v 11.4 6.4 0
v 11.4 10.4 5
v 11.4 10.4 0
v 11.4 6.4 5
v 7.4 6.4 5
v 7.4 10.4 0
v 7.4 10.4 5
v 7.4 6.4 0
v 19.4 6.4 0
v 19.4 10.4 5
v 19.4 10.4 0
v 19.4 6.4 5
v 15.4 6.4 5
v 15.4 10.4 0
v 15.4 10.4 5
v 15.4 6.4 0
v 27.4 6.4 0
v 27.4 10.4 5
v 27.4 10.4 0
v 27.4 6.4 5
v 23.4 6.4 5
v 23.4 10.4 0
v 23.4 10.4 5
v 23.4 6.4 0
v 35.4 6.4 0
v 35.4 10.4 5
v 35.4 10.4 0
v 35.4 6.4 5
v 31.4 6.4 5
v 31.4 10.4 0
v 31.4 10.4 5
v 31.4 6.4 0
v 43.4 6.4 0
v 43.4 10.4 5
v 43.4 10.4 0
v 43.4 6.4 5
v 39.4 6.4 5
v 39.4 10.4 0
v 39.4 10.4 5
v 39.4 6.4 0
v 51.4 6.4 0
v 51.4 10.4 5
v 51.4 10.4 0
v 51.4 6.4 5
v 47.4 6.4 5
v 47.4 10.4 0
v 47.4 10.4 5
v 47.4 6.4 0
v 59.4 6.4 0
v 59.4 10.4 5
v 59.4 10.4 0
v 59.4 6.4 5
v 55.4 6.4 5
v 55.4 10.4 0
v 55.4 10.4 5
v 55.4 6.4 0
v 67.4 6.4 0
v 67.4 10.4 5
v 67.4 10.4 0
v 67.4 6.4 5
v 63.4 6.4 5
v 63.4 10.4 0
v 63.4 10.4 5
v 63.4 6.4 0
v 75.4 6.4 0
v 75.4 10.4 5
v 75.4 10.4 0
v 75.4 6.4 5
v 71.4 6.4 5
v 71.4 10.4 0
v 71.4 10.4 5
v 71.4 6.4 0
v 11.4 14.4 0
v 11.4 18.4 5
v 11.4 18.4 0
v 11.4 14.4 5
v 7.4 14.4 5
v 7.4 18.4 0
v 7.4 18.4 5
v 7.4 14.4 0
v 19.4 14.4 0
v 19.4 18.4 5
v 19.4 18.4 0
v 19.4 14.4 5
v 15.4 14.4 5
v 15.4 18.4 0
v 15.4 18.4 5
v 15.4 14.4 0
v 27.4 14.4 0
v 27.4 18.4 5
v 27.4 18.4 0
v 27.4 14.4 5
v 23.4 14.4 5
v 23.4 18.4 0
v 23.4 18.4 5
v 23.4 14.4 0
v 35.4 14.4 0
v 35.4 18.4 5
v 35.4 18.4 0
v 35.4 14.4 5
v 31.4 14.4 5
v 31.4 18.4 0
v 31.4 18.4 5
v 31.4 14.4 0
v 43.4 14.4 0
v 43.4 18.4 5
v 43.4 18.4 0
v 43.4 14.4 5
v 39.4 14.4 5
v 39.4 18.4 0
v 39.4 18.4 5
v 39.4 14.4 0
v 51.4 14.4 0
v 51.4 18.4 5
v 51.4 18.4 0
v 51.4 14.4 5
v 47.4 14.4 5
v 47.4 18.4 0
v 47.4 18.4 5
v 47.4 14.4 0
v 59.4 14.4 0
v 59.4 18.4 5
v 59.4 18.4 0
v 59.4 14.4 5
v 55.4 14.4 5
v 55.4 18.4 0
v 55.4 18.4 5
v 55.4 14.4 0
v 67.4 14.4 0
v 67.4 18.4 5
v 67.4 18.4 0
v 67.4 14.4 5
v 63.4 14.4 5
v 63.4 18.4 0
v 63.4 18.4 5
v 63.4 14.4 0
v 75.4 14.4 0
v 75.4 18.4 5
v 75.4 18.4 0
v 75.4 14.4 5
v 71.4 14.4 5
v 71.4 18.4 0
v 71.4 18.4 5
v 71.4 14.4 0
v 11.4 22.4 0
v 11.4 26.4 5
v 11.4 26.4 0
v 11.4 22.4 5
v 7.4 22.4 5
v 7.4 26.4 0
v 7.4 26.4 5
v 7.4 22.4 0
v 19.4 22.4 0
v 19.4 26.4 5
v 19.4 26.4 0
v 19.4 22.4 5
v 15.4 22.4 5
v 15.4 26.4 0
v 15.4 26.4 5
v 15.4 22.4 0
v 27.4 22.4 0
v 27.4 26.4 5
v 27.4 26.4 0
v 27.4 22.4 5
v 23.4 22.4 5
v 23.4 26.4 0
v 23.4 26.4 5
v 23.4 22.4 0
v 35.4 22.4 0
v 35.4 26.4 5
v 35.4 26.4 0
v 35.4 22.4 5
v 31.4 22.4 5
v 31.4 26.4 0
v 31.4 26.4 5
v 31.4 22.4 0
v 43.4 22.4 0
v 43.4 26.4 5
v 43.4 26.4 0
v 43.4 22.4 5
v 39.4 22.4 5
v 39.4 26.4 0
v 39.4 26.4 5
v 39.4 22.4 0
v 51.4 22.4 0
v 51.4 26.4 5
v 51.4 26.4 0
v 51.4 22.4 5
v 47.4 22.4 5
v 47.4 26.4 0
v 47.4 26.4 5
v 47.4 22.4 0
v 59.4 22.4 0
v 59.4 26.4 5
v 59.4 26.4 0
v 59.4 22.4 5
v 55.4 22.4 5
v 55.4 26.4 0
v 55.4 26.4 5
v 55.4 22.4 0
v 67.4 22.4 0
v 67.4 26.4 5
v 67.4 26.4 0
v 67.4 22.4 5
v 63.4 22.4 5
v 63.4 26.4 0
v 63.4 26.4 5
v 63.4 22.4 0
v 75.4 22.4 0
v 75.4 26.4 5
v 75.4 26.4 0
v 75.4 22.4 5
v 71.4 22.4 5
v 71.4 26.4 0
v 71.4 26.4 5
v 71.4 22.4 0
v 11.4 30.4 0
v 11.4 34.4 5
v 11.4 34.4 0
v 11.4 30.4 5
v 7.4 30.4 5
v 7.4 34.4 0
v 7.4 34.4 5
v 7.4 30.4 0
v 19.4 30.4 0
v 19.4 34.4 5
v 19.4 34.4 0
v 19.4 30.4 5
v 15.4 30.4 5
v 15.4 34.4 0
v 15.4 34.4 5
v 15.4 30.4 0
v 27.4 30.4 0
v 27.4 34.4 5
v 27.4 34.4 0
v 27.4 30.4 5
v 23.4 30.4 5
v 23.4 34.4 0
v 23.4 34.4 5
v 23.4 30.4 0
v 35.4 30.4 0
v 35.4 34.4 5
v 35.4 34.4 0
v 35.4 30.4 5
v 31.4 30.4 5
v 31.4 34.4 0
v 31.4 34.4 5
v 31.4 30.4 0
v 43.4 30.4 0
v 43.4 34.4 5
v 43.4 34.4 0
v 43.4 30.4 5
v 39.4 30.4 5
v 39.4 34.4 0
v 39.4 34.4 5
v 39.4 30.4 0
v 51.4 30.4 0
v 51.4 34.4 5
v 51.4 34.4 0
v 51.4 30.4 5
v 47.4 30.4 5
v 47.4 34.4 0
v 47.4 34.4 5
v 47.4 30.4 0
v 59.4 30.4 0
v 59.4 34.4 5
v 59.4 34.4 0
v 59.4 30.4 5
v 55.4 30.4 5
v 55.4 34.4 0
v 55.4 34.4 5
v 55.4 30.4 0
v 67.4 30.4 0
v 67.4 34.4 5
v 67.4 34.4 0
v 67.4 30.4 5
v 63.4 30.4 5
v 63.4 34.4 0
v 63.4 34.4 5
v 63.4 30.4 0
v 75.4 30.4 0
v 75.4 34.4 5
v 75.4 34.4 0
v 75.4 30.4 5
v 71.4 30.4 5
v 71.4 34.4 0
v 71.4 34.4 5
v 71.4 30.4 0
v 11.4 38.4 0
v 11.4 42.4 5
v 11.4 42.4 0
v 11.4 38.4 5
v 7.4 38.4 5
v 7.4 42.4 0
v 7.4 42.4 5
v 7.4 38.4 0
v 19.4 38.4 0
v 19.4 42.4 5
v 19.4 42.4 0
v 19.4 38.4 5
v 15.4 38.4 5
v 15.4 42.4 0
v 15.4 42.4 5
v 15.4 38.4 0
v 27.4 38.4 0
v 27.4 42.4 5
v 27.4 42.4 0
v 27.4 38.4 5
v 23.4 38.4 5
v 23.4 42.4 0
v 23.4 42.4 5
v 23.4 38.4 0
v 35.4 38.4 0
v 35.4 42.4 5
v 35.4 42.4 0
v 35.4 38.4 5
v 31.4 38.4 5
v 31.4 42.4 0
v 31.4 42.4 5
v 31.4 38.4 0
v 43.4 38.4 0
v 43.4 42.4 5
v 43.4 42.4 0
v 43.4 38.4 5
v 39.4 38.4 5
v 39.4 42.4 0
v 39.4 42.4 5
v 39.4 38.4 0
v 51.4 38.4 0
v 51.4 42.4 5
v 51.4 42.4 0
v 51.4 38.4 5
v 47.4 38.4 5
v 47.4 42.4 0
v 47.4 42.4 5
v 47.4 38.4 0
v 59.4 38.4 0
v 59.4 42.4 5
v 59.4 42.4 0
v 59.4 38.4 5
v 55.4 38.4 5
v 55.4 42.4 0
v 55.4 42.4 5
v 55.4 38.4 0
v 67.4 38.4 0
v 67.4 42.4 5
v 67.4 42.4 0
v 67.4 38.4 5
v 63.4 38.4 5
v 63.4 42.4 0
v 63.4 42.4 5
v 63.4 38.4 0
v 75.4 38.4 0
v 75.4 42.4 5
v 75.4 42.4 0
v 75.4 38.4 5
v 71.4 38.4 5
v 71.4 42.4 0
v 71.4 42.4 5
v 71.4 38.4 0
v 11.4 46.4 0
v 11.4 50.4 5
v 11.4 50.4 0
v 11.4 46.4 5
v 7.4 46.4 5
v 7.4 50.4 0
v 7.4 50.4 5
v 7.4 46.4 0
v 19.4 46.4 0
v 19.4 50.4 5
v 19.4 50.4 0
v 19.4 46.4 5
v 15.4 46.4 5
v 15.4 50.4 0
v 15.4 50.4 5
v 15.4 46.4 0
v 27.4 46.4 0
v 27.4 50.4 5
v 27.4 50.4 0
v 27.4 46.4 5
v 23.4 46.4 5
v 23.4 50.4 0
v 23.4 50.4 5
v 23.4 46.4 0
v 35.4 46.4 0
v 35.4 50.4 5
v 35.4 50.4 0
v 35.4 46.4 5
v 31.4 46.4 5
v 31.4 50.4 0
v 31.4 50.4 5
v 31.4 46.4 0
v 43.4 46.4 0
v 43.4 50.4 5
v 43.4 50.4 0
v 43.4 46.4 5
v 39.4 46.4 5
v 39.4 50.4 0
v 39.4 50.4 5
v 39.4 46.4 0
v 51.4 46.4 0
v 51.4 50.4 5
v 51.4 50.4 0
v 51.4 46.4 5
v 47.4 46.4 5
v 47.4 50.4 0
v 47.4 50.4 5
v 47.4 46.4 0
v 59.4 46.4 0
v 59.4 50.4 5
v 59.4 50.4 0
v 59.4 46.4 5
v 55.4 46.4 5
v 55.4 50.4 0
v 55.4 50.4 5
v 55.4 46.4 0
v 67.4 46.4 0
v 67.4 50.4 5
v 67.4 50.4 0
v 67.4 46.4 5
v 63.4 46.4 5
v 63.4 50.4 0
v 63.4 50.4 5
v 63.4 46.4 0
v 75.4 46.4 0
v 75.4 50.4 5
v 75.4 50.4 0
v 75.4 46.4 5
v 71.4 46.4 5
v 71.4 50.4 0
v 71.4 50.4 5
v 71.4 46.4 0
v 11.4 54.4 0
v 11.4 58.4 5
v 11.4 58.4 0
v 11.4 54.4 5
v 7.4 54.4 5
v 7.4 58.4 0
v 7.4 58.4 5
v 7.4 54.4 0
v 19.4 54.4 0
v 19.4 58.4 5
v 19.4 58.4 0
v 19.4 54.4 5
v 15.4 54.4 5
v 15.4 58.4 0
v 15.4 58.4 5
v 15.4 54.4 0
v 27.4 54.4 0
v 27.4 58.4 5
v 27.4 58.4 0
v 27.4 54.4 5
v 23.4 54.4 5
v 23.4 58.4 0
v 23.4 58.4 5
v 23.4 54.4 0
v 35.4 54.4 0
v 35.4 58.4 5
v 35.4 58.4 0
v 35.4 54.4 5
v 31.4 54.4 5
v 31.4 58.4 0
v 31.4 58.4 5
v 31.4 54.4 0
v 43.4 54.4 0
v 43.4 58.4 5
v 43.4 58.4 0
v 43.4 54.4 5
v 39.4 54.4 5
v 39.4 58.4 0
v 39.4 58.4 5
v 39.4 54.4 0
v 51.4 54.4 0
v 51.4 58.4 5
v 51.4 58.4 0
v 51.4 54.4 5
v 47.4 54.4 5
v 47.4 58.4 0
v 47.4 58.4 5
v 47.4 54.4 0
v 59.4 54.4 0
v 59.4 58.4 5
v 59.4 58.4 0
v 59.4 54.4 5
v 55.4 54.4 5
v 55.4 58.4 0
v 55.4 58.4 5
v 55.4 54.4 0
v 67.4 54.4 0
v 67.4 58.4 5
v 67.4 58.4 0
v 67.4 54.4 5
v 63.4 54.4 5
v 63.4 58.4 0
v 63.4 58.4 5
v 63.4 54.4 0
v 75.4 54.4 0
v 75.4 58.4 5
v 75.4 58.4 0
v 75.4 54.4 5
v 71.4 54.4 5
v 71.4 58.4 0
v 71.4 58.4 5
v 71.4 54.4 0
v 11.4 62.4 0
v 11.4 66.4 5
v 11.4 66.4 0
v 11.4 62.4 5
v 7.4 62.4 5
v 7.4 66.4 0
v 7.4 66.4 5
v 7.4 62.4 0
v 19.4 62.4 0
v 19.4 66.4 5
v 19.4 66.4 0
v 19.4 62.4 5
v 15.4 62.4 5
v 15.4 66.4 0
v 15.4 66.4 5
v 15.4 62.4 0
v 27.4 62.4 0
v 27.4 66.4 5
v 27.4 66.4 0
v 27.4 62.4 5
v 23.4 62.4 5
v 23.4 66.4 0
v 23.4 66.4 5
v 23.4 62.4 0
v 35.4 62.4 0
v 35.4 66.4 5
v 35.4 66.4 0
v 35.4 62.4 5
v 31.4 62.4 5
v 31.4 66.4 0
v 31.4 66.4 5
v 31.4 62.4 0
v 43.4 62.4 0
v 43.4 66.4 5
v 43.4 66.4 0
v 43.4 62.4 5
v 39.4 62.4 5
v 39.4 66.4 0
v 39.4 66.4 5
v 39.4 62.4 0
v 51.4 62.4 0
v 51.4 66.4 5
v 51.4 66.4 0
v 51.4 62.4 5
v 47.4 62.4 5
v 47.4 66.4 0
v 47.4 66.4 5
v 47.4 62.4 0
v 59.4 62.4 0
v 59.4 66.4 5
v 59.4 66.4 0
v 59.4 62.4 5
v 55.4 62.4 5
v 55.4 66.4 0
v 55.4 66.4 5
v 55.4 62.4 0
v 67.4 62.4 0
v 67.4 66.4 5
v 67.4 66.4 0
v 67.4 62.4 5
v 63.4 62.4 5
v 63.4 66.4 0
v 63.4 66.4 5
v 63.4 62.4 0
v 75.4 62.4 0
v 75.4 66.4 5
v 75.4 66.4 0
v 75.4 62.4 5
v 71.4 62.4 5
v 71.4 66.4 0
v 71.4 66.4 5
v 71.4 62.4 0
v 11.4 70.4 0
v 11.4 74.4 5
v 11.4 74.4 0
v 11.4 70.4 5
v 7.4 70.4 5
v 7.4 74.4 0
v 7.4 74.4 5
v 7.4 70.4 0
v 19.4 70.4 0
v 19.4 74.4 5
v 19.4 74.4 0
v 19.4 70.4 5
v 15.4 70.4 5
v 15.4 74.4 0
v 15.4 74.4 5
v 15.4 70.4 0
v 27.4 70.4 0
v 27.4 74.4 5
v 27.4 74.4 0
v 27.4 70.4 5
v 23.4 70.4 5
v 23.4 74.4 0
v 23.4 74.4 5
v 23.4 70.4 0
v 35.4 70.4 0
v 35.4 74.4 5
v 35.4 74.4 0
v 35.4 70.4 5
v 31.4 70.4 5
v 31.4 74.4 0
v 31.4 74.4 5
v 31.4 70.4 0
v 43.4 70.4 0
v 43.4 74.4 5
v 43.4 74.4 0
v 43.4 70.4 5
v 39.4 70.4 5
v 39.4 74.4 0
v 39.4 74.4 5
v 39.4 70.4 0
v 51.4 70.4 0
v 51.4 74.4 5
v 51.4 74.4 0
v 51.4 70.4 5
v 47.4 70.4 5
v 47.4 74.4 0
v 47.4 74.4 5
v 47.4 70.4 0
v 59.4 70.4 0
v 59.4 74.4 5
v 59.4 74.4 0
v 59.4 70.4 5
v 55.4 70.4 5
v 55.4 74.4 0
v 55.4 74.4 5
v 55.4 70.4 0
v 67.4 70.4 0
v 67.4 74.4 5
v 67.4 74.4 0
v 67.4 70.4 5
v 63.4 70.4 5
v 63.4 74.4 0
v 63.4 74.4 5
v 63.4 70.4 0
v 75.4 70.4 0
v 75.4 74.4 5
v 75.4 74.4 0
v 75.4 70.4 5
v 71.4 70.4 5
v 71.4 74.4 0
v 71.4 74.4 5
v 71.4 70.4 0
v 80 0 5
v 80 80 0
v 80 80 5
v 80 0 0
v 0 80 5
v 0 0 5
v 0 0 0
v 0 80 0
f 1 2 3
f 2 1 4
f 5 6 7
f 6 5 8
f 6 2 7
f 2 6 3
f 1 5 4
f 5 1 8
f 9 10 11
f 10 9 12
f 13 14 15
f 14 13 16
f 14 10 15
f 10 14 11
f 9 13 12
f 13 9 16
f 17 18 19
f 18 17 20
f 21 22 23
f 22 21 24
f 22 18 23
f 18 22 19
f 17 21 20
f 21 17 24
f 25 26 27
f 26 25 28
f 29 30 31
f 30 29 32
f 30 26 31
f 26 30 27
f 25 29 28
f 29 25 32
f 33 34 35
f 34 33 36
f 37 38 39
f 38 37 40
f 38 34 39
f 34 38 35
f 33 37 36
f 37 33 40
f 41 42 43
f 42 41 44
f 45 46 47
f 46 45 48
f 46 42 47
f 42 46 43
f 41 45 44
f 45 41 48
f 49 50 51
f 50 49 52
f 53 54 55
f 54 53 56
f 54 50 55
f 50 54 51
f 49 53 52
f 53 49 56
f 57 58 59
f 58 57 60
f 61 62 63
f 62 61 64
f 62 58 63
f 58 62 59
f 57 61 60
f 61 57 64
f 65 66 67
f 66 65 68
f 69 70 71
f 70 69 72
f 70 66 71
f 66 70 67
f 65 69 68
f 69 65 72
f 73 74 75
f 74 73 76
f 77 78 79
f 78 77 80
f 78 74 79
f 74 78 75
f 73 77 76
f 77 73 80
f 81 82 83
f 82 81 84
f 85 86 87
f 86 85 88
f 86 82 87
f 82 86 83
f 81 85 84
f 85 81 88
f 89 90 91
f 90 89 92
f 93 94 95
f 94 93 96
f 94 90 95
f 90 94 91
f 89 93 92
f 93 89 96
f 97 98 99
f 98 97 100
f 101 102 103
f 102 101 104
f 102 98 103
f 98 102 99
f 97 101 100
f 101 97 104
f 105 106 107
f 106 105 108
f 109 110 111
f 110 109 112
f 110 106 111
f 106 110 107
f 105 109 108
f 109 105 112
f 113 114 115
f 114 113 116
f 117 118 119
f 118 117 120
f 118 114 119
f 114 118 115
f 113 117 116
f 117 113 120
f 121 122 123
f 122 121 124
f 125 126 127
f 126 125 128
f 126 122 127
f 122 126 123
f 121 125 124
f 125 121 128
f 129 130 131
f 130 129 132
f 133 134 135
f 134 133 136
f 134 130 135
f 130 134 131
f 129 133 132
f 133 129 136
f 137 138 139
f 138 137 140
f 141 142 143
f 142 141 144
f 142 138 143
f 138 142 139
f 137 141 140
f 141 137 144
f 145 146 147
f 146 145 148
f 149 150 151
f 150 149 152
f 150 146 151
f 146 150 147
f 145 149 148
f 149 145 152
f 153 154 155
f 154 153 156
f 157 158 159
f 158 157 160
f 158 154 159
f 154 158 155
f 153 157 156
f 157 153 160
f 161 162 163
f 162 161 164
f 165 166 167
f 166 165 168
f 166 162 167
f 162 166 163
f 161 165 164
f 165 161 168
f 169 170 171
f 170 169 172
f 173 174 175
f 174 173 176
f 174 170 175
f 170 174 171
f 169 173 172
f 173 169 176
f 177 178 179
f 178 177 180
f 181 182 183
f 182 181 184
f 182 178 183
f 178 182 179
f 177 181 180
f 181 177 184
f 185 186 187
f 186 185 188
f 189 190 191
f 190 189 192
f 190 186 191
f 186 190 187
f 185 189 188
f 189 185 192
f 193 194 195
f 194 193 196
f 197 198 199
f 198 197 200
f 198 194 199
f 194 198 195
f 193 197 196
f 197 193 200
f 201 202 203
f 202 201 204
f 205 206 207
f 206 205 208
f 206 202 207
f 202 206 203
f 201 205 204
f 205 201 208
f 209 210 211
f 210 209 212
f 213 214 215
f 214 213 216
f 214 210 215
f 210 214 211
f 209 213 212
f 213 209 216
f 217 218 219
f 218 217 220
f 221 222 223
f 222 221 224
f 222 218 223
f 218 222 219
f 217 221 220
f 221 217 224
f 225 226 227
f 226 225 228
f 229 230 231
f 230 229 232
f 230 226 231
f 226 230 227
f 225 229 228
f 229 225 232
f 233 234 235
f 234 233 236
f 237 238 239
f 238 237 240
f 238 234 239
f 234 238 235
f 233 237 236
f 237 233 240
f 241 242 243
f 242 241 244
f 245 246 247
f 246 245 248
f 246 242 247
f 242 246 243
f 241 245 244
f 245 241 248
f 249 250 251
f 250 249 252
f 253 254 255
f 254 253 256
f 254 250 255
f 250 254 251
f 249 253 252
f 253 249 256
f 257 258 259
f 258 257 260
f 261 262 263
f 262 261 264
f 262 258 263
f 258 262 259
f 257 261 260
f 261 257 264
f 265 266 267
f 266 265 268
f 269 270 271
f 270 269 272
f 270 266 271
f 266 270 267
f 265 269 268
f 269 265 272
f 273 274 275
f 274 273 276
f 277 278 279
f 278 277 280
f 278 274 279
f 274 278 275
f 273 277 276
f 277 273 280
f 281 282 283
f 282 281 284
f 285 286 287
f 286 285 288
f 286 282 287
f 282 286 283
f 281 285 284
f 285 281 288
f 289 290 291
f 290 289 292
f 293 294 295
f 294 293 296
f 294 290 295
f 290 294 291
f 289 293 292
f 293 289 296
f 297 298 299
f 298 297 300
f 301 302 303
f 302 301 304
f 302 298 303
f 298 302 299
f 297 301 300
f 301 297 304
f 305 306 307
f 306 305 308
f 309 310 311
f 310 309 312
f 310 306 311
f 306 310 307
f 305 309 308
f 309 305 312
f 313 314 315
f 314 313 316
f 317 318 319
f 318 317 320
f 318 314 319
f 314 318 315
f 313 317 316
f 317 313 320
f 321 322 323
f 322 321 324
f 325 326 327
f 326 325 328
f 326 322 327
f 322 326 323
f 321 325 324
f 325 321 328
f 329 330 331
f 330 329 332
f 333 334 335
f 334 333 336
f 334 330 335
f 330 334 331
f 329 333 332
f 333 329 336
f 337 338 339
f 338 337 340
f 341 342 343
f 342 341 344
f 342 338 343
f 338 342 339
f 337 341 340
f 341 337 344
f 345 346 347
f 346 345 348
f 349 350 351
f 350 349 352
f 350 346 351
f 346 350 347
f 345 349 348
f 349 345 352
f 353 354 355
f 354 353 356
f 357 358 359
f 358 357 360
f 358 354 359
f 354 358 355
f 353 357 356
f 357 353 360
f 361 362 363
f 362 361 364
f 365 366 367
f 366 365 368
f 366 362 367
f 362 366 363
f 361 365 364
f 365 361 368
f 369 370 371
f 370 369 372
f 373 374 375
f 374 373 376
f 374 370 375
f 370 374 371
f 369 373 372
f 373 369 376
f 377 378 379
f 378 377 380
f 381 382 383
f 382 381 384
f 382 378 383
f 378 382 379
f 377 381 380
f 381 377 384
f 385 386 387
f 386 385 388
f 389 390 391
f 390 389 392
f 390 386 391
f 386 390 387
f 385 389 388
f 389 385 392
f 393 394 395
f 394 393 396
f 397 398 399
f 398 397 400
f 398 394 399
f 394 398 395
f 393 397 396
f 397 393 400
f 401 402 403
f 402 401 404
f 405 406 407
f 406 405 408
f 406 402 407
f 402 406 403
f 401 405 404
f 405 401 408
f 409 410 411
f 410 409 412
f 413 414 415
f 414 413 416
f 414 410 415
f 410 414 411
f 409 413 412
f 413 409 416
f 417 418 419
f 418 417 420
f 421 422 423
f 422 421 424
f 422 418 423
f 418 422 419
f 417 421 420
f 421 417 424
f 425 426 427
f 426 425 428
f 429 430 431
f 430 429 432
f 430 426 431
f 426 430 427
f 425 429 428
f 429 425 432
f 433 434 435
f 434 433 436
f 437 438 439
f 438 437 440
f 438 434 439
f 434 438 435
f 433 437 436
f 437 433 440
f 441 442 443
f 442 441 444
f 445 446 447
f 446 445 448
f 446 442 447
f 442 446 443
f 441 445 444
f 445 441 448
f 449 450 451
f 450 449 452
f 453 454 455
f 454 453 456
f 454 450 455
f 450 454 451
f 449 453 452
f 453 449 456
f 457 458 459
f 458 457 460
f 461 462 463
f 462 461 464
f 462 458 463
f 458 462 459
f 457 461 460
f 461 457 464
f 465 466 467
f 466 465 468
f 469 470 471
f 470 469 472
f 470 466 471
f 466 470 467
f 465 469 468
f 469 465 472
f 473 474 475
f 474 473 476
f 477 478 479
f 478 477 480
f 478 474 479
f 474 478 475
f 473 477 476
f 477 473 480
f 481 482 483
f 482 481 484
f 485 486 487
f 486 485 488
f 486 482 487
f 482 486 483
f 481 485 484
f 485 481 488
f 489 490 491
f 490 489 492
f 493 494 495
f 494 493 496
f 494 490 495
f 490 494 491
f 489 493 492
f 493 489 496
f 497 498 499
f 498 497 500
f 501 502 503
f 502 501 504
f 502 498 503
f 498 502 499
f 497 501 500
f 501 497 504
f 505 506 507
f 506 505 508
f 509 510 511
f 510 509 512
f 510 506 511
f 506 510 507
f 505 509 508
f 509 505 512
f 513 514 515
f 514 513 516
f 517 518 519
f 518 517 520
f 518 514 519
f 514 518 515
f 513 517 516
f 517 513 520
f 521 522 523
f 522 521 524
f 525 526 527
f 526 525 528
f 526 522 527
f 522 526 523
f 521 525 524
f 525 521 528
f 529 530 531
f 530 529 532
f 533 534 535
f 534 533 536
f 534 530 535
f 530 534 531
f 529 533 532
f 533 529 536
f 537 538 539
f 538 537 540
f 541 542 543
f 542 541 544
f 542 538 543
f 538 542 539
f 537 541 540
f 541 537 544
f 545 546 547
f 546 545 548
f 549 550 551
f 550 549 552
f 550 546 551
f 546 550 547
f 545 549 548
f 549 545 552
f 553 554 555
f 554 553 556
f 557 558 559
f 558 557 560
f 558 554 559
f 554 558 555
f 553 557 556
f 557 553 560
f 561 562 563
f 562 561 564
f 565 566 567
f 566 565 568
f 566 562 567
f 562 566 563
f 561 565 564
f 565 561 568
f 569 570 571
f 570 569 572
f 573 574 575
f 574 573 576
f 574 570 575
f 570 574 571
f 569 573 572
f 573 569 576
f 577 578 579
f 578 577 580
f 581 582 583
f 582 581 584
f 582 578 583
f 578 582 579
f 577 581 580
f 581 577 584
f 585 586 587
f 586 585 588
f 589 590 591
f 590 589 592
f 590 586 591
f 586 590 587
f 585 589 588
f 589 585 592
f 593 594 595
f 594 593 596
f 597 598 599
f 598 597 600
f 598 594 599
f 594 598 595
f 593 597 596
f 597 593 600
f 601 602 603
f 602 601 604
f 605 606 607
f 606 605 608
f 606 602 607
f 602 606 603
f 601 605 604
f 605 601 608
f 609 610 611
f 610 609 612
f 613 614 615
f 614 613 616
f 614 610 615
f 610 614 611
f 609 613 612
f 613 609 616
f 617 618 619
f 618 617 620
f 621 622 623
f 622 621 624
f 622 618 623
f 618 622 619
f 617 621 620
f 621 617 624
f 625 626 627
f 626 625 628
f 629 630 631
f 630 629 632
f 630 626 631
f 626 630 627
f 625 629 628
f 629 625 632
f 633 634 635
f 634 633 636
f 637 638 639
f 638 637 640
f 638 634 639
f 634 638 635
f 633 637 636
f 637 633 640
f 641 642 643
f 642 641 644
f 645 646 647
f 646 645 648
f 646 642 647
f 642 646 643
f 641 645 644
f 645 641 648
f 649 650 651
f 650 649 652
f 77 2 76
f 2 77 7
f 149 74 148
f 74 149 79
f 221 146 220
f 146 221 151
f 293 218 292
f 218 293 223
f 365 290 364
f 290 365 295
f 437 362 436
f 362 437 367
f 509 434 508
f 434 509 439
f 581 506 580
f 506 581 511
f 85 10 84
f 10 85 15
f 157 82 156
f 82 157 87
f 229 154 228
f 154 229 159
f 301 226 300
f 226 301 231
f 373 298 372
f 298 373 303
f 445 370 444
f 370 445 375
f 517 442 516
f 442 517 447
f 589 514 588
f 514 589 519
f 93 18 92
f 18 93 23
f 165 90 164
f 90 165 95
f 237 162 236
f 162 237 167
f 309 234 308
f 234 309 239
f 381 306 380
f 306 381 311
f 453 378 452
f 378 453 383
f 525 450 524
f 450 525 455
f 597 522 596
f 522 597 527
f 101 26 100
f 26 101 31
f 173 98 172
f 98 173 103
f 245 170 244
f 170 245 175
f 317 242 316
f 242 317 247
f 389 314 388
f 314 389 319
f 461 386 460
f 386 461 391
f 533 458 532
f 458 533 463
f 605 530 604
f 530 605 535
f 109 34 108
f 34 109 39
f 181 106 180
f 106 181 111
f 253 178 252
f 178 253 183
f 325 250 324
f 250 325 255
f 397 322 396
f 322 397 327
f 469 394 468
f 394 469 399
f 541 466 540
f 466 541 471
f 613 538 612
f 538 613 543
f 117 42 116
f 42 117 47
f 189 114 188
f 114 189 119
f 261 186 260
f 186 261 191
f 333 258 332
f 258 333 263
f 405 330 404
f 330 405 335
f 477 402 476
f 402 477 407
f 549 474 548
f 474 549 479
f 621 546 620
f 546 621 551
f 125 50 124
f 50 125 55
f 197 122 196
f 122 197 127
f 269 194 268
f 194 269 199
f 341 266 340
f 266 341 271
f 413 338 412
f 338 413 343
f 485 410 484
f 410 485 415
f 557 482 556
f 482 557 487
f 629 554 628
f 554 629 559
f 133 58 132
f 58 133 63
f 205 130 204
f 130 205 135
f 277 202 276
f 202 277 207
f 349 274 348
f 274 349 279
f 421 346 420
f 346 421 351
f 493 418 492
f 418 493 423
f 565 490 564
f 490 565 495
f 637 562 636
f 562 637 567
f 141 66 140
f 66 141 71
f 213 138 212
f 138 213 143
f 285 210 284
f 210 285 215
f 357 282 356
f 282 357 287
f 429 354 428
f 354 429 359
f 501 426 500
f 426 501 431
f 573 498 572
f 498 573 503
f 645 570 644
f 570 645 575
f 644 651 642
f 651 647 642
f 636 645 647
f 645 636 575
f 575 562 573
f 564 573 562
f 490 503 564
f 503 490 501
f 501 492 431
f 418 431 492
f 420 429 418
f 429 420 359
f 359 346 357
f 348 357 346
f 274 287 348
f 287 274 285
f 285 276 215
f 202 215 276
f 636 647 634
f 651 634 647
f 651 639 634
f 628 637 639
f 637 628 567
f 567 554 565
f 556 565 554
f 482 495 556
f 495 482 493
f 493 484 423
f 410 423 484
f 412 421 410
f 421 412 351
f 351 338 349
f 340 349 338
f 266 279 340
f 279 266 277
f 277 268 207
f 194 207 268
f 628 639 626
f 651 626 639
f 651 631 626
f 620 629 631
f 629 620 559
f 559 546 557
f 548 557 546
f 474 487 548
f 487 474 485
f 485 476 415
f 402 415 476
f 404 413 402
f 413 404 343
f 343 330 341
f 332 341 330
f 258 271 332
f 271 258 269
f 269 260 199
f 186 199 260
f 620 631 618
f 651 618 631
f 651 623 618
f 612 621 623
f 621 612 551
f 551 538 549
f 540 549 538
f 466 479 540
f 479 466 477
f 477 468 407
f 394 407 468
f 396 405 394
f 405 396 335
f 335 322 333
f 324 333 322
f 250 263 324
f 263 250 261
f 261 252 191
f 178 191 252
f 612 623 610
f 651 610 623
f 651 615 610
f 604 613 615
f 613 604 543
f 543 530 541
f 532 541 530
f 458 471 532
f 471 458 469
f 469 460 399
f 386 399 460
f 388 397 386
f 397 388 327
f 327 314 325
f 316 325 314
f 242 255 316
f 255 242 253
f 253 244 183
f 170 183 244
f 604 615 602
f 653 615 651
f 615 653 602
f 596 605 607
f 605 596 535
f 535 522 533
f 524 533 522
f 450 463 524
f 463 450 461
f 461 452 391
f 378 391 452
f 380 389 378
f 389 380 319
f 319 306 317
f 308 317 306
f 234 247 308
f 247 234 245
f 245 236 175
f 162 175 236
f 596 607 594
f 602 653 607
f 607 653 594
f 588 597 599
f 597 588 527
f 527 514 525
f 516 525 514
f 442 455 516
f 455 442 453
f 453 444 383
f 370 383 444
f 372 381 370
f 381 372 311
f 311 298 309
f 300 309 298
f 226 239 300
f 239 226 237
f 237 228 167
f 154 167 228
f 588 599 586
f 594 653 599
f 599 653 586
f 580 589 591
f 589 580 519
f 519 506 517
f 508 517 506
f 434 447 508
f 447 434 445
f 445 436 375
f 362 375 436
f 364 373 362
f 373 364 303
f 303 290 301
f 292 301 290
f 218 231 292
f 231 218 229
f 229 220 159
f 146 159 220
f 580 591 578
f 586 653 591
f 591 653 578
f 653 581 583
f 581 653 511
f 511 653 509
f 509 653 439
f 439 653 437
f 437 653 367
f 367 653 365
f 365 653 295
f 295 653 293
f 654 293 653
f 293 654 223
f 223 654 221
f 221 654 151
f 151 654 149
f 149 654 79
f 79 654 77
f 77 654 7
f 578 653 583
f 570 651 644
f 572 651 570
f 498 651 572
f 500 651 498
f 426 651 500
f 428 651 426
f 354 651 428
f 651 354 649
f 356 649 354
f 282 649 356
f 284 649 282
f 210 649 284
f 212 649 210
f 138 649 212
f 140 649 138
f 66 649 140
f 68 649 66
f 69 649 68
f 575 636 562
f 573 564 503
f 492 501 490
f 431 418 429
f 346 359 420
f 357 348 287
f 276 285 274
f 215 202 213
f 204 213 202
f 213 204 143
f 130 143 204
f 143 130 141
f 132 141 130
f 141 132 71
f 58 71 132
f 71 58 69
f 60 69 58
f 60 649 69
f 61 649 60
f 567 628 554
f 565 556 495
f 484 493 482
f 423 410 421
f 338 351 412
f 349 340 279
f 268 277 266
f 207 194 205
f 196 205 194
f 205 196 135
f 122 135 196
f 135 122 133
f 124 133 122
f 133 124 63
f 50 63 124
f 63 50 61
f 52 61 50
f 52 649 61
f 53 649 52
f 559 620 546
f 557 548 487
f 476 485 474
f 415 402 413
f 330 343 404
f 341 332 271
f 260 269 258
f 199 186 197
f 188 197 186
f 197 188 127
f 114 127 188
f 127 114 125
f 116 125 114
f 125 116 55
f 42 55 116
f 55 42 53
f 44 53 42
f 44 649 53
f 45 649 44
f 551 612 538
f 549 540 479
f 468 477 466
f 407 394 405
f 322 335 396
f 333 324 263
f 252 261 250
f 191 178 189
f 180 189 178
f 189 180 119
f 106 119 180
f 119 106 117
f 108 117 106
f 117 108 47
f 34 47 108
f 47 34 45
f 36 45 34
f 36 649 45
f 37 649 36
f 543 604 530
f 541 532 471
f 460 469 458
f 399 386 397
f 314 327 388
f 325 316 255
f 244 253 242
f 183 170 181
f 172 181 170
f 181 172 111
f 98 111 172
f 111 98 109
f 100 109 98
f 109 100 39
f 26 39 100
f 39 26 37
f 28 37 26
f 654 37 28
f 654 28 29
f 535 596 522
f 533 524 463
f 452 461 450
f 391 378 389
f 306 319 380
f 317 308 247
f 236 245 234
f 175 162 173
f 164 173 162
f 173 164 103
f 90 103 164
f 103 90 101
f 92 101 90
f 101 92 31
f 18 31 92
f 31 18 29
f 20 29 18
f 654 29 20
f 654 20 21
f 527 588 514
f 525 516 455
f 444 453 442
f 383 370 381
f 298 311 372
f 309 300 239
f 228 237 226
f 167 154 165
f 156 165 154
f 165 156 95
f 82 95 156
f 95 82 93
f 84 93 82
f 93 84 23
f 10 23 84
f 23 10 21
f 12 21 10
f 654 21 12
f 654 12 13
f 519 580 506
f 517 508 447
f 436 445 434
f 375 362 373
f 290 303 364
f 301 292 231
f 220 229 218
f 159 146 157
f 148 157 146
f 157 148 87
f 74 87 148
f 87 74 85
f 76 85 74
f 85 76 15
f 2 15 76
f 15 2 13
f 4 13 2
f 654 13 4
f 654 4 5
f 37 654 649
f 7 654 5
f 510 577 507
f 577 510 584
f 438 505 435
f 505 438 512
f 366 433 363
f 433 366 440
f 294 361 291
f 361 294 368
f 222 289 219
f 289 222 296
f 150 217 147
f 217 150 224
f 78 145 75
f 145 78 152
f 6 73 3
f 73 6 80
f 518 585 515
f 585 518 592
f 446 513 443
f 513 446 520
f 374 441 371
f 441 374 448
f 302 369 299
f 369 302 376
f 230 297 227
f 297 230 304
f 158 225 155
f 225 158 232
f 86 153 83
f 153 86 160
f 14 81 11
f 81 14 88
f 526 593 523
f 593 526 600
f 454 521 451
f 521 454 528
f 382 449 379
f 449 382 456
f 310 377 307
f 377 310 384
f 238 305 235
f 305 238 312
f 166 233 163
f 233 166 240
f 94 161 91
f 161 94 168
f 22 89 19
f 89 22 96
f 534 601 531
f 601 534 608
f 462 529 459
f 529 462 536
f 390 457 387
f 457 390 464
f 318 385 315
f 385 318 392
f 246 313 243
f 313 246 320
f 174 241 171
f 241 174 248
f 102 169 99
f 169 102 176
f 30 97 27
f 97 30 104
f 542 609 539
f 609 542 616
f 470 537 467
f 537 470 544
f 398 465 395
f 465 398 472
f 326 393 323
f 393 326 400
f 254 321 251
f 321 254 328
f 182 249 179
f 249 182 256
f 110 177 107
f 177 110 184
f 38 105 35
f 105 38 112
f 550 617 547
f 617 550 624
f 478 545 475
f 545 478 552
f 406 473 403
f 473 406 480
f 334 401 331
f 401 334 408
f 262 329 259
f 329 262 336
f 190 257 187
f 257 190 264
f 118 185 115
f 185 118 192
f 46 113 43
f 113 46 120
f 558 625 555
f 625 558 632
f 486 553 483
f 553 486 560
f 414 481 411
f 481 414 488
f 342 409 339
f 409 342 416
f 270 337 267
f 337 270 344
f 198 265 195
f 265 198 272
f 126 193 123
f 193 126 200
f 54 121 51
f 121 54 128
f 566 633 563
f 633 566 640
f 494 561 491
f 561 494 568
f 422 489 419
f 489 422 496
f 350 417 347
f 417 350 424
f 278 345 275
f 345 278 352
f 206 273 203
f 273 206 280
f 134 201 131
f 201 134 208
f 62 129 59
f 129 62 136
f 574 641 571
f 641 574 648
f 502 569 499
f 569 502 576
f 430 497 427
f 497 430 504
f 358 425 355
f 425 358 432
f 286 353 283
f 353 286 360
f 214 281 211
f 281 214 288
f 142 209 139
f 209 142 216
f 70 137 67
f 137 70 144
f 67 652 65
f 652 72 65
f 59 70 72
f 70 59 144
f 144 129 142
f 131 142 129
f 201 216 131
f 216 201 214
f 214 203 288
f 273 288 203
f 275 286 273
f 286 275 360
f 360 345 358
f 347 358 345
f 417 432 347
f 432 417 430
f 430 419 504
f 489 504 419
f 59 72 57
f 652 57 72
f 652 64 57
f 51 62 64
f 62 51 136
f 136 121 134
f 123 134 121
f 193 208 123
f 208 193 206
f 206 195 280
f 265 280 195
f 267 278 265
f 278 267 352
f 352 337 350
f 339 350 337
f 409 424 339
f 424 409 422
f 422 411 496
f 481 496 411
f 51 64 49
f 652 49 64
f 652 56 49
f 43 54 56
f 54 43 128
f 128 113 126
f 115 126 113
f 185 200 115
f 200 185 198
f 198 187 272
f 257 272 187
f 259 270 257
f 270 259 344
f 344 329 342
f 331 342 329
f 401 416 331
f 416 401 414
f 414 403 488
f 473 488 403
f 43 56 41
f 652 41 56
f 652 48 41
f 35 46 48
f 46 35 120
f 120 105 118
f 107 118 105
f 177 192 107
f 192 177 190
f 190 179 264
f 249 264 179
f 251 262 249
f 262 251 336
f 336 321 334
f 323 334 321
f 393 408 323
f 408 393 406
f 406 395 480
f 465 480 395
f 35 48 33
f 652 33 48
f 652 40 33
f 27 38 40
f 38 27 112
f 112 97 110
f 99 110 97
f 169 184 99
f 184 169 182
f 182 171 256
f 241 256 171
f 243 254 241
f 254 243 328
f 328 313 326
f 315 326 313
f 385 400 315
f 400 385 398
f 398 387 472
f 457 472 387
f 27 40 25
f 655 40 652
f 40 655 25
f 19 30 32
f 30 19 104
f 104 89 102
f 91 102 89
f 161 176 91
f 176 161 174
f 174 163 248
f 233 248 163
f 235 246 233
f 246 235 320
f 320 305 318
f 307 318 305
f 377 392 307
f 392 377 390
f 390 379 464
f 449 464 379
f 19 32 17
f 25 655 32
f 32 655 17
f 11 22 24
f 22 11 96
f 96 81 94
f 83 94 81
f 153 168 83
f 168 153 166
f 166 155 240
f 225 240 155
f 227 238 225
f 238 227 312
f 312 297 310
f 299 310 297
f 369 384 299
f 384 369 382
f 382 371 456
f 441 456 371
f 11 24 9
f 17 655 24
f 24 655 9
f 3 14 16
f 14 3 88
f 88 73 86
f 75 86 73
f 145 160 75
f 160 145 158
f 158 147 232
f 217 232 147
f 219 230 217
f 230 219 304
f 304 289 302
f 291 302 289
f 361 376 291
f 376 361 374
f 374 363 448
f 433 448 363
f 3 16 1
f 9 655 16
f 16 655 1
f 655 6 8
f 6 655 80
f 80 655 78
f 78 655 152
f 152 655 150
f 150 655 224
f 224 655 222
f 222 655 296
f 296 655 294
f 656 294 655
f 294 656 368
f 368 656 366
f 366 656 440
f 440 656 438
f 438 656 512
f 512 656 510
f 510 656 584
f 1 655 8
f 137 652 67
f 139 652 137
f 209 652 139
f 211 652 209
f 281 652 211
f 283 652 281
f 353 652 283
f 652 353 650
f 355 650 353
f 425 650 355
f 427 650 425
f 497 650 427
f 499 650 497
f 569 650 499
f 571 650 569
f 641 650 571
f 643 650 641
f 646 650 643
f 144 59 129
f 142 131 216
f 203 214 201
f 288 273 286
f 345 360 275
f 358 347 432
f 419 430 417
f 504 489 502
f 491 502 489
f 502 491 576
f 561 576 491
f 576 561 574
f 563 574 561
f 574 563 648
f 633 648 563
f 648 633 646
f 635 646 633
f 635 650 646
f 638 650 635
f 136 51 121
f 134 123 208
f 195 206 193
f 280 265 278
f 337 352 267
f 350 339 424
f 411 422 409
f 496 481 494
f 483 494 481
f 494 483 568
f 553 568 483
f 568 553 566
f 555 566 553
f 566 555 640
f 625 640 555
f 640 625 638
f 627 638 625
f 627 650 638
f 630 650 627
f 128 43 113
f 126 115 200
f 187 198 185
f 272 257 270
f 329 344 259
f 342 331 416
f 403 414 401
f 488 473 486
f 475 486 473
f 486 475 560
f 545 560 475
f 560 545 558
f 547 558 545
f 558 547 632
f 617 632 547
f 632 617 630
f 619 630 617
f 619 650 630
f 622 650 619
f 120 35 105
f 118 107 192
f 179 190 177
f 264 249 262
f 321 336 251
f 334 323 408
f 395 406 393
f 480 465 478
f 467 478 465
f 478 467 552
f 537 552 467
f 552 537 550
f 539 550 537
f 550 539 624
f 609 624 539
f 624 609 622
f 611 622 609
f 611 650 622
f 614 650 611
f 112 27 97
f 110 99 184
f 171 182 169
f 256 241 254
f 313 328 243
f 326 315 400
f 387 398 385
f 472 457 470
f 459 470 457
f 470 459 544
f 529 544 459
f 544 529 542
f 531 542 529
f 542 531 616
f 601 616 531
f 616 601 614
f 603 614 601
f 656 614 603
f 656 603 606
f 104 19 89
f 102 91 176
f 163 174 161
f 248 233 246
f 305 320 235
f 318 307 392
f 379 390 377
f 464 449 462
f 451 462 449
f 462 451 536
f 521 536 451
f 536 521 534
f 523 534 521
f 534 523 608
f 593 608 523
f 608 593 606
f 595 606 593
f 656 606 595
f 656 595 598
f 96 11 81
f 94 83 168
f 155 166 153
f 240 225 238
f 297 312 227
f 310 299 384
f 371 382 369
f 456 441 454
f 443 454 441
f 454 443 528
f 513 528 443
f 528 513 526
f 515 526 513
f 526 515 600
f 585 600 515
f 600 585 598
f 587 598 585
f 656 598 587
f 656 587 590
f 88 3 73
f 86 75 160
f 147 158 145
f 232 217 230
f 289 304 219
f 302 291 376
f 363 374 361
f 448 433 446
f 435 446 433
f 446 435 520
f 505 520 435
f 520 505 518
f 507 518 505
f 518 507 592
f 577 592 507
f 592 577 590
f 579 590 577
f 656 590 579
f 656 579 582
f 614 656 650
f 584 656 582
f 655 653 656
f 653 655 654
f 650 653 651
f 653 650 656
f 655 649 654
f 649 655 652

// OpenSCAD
w = 80;
h = 80;
d = 5;

hw = 4;
hwgap = 4;
count = w / (hw + hwgap);

difference(){
    cube([w, h, d]);
  for(i =  [0.8 : count-1]){
        translate([1, i * (hw + hwgap)-5, 0])
        union()
        for( i = [0.8 : count-1]){
            color("red")
            translate([i * (hw + hwgap), 5, -1])
            cube([hw, hw, d+2]);
            }
           
        }  
}
